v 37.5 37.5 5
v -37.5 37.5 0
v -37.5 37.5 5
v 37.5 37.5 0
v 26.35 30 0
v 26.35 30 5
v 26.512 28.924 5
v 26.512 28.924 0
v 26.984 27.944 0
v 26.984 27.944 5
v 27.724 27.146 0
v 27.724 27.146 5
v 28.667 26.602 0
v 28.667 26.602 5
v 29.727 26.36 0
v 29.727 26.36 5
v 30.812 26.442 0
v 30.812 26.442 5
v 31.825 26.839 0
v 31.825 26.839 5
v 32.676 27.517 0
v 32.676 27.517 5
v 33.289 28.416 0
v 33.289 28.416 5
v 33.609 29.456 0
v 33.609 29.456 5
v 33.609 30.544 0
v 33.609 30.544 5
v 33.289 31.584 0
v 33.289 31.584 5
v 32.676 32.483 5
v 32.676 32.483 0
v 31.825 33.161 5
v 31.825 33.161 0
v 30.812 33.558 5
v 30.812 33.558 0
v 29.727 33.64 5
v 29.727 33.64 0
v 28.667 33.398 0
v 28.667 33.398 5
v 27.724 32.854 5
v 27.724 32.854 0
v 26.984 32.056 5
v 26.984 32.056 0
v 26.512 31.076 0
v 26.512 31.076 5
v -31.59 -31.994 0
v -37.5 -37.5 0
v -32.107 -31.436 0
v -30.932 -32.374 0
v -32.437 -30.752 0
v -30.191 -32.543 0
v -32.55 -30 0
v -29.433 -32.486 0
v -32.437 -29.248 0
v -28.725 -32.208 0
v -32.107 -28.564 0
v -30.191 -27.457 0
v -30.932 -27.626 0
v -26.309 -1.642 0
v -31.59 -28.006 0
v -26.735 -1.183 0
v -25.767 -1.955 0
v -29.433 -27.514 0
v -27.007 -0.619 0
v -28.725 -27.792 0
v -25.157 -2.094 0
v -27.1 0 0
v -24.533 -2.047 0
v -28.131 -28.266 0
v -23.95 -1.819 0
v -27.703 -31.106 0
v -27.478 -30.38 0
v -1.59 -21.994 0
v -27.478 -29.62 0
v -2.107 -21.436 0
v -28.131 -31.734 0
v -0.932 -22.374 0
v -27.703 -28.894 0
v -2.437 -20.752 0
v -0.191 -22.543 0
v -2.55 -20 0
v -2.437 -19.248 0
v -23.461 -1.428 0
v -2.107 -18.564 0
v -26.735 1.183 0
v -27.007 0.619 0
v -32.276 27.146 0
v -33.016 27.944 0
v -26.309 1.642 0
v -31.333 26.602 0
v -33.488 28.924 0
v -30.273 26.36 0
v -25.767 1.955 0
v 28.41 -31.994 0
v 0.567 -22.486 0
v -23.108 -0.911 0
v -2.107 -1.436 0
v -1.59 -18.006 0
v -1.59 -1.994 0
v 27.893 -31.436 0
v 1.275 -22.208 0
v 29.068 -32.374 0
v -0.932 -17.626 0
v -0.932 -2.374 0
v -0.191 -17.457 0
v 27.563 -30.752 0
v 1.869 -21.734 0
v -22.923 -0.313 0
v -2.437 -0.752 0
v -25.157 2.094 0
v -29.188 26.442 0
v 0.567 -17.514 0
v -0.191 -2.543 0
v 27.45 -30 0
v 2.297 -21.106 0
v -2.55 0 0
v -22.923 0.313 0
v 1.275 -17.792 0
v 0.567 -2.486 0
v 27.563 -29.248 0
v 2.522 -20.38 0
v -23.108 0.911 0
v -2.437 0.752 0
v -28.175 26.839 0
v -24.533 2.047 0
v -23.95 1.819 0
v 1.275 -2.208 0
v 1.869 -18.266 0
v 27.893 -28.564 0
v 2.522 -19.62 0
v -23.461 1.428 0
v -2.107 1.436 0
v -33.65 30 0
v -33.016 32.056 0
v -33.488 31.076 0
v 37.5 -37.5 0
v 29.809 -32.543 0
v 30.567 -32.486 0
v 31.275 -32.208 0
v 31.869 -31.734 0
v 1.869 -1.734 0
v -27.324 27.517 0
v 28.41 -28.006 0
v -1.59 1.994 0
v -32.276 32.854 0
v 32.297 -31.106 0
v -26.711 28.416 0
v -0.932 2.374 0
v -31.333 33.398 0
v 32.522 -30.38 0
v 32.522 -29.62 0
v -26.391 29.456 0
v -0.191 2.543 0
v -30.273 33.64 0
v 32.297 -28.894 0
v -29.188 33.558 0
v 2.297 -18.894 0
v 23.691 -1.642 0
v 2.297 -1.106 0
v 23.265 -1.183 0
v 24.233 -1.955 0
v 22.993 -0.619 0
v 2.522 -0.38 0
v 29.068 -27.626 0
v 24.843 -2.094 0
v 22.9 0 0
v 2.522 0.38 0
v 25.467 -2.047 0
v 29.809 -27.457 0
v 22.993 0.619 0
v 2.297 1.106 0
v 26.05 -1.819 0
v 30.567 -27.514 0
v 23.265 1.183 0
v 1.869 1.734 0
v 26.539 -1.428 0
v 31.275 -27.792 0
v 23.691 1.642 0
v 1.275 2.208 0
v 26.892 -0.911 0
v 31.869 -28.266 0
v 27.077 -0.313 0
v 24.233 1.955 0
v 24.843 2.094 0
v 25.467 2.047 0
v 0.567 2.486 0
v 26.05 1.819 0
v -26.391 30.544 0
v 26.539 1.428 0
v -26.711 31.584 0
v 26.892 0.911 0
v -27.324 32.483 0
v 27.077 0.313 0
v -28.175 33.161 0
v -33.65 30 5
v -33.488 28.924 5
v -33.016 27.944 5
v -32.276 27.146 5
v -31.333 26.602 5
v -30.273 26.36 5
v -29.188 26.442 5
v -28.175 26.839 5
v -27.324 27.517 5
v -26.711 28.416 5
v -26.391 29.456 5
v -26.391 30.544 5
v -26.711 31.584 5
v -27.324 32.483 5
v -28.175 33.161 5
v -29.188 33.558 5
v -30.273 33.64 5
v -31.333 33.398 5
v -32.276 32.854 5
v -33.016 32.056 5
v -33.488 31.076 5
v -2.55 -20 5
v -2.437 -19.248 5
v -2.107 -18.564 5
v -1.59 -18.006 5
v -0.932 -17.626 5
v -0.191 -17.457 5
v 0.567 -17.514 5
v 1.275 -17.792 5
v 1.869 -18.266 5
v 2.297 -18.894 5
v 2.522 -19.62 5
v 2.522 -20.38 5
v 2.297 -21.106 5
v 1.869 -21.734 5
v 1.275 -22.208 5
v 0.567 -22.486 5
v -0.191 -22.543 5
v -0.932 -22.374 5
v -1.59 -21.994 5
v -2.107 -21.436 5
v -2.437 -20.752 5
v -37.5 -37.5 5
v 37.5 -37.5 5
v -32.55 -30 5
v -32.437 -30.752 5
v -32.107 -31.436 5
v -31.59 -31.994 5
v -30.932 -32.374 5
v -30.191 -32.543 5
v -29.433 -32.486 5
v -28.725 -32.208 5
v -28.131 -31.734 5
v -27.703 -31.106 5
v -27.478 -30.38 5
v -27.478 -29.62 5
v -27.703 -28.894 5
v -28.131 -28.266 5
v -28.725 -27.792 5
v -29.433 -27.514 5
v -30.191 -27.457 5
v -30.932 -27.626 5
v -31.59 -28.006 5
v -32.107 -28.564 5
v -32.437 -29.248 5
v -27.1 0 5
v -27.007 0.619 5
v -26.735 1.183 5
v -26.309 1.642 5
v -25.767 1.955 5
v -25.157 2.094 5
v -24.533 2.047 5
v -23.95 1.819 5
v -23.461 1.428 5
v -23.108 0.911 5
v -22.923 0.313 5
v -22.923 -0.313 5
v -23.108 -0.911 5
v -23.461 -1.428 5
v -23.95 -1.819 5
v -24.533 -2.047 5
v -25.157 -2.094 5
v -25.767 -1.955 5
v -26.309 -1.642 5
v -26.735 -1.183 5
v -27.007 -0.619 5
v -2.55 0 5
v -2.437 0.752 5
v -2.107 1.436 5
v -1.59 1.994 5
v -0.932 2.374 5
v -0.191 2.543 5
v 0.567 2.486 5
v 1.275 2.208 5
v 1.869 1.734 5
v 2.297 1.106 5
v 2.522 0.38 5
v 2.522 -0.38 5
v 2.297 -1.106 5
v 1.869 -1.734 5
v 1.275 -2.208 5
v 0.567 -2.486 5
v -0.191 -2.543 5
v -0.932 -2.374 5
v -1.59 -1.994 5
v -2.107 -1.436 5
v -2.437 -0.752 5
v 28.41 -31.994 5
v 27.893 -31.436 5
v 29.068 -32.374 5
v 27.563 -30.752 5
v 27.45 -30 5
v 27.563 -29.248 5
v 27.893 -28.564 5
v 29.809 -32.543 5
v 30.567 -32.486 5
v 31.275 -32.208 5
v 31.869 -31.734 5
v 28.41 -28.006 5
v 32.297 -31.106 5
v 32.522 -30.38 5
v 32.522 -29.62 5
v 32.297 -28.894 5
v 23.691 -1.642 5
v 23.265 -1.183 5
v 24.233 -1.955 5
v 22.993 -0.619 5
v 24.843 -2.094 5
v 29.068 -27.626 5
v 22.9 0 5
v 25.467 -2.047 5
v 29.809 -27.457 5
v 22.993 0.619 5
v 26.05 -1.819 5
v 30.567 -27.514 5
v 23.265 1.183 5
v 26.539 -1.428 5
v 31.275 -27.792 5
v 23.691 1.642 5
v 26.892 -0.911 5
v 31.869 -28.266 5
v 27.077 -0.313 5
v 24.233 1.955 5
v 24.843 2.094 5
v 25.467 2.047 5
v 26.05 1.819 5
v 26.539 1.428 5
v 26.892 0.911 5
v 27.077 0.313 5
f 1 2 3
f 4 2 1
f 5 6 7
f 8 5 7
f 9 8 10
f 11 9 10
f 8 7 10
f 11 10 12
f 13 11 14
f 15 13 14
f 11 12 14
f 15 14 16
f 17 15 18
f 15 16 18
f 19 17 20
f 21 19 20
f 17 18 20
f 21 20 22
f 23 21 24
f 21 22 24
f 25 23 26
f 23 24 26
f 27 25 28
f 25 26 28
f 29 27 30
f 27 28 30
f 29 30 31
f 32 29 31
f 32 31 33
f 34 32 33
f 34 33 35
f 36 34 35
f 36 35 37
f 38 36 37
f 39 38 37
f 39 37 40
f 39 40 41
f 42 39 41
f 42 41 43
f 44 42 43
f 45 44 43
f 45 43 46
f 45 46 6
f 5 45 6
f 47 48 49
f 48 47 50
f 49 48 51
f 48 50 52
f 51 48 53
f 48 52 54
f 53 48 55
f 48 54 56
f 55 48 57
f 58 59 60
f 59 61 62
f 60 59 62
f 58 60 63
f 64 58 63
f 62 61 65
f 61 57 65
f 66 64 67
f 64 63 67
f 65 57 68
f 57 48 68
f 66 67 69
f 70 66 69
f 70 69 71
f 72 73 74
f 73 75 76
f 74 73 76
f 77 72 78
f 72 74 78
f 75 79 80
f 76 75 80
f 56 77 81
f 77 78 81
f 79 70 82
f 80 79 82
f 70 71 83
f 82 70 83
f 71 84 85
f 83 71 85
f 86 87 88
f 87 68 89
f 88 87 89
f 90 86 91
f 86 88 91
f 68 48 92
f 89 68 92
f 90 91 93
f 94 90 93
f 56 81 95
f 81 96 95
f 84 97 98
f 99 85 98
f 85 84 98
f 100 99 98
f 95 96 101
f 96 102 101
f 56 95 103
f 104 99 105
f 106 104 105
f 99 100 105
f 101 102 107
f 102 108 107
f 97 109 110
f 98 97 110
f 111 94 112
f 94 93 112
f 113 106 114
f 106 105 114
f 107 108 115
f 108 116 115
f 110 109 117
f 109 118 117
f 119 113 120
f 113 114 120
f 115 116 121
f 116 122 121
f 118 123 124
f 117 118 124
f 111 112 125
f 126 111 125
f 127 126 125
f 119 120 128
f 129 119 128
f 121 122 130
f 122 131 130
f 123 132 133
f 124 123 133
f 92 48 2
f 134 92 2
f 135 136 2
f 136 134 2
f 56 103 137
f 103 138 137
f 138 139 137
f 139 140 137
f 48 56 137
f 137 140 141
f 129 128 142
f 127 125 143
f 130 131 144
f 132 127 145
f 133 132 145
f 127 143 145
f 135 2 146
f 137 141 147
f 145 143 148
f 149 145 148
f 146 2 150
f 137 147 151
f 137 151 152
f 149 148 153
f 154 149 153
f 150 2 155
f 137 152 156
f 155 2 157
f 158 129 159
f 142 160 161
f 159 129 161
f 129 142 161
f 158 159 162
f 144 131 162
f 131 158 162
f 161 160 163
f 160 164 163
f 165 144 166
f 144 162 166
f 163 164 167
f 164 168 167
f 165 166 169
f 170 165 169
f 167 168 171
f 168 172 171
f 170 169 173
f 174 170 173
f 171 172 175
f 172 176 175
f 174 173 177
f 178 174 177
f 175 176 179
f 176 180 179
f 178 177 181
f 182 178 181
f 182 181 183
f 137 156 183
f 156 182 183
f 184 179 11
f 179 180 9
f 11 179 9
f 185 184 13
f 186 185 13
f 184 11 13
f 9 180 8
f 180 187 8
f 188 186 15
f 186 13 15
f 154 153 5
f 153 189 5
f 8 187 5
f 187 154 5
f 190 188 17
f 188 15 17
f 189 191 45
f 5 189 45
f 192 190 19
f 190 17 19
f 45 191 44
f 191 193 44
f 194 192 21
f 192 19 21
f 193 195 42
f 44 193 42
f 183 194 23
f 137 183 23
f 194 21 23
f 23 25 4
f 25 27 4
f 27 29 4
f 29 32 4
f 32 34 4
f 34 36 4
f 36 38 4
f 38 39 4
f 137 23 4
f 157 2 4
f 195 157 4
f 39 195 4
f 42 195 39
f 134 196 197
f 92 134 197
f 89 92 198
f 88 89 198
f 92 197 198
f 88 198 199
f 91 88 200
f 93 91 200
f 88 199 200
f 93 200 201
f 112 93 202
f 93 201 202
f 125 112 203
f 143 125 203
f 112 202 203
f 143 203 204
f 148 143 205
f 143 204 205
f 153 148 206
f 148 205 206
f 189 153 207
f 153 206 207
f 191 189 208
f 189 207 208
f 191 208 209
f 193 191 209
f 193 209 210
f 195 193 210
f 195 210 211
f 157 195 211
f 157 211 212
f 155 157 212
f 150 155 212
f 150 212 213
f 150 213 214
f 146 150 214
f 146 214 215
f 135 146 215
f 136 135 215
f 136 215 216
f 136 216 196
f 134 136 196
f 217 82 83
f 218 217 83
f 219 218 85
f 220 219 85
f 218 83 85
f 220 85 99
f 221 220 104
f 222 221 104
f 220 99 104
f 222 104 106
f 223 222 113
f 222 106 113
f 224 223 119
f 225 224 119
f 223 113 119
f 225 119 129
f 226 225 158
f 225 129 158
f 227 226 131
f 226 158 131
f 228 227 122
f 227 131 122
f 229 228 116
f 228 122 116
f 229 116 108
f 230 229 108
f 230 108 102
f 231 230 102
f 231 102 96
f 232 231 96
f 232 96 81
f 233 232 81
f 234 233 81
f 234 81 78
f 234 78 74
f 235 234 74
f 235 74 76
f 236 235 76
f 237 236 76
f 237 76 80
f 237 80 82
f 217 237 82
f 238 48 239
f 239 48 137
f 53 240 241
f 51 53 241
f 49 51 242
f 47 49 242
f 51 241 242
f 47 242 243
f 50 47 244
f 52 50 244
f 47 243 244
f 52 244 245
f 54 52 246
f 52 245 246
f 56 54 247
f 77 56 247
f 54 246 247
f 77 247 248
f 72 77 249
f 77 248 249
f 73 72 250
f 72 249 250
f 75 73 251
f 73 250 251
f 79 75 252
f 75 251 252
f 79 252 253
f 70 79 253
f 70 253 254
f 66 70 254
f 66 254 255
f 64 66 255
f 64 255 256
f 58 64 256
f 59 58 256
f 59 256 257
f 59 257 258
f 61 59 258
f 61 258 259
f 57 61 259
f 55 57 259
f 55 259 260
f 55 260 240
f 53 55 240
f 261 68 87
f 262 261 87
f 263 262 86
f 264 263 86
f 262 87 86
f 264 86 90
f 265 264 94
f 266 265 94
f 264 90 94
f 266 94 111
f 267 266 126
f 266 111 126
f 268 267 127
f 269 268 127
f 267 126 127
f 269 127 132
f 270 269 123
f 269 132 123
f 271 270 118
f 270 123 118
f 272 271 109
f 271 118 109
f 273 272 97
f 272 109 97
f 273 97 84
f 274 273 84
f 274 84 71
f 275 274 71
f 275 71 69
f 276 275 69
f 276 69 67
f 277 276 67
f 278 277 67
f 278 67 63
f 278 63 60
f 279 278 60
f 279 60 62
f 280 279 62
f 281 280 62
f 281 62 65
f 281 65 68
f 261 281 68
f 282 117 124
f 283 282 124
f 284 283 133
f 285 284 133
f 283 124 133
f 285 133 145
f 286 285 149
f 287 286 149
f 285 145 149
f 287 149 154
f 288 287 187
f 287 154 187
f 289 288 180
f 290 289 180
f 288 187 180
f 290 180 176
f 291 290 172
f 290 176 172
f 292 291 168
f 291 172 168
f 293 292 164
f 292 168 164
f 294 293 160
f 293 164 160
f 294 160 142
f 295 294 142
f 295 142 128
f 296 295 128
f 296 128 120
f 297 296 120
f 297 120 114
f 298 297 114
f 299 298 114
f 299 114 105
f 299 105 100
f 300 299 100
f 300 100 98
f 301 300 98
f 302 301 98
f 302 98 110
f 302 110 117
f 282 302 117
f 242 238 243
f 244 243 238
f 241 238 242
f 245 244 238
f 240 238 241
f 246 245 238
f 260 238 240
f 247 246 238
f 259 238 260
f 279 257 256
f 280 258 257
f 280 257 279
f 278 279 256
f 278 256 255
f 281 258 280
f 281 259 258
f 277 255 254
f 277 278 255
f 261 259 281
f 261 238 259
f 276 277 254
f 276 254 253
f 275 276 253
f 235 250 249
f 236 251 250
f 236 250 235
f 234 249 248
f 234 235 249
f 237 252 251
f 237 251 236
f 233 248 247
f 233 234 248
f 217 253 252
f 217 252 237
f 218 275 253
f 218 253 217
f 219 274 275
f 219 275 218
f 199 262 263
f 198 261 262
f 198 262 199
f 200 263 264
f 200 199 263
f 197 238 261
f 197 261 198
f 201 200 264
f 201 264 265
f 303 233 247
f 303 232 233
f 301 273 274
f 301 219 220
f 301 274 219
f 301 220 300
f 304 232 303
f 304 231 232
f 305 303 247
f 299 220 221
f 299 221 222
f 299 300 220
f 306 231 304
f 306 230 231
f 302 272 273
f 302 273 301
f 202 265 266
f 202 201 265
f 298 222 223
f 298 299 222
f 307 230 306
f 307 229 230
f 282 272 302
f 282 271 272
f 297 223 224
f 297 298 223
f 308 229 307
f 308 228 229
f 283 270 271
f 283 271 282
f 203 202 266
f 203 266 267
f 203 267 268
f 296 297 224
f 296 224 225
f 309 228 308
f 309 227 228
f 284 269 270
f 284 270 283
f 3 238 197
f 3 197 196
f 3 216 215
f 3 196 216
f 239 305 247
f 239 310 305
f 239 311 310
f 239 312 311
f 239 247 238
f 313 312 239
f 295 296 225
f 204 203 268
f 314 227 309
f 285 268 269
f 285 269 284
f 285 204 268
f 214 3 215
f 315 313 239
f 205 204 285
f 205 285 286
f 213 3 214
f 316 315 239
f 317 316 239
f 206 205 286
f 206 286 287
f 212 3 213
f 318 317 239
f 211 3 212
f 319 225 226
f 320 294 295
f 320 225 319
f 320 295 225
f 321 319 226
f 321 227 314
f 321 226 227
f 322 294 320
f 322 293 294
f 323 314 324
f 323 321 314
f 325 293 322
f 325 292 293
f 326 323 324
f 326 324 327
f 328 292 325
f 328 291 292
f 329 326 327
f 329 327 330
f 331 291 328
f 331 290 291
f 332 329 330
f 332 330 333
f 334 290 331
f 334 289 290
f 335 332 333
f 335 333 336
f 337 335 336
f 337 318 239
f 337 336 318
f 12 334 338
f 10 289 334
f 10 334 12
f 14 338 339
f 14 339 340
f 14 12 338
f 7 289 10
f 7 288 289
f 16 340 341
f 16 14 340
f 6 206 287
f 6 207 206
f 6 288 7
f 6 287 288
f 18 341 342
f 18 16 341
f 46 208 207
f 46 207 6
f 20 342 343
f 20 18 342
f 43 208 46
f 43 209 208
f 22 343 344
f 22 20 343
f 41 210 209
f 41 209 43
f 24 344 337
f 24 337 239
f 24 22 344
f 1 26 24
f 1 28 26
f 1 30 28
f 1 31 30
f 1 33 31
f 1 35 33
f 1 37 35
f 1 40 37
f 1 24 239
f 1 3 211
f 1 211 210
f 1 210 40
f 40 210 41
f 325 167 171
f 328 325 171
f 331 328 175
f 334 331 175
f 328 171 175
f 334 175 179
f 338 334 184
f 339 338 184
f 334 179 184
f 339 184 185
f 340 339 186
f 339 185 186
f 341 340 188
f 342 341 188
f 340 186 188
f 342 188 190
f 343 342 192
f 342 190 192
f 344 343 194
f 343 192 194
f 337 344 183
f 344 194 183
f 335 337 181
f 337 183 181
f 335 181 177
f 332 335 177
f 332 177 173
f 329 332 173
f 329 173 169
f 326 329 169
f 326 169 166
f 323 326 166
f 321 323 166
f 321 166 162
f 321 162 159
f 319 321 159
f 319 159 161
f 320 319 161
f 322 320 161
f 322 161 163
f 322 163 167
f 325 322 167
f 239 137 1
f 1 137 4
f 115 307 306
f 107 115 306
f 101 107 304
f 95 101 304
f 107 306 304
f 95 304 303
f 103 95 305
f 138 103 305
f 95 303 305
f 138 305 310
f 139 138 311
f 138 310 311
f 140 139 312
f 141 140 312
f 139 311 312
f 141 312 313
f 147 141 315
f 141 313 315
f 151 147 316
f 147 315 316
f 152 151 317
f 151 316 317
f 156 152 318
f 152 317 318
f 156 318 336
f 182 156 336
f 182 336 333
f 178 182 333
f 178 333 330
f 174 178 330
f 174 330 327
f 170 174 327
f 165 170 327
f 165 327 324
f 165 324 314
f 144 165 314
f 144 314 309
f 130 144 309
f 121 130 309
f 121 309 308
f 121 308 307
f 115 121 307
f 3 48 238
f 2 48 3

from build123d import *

# Parameters (mm, degrees)
F3_W     = 75
F3_H     = 75
F3_W_2   = 60
F3_H_2   = 60
F4_DEPTH = 5
F5_D     = 5.1
F0_D     = 7.3
F1_D     = 5.1
F7_D     = 4.2


with BuildPart() as f4:
    # F3 (on Top) → F4 (new body)
    with BuildSketch(Plane.XY):
        Rectangle(F3_W, F3_H)
        Rectangle(F3_W_2, F3_H_2, mode=Mode.SUBTRACT)
        Rectangle(F3_W_2, F3_H_2)
    extrude(amount=F4_DEPTH)

    # F5 (through all)
    with Locations(Plane(origin=(0, 0, 0), x_dir=(1, 0, 0), z_dir=(0, 0, -1))):
        with Locations((-30, 30), (30, 30)):
            Hole(F5_D / 2)

    # F0 (through all)
    with Locations(Plane(origin=(0, 0, 0), x_dir=(1, 0, 0), z_dir=(0, 0, -1))):
        with Locations((-30, -30), (30, -30)):
            Hole(F0_D / 2)

    # F1 (through all)
    with Locations(Plane.XY.offset(5)):
        with Locations((0, 0), (0, -20)):
            Hole(F1_D / 2)

    # F7 (through all)
    with Locations(Plane.XY.offset(5)):
        with Locations((25, 0), (-25, 0)):
            Hole(F7_D / 2)


solid = f4.part
